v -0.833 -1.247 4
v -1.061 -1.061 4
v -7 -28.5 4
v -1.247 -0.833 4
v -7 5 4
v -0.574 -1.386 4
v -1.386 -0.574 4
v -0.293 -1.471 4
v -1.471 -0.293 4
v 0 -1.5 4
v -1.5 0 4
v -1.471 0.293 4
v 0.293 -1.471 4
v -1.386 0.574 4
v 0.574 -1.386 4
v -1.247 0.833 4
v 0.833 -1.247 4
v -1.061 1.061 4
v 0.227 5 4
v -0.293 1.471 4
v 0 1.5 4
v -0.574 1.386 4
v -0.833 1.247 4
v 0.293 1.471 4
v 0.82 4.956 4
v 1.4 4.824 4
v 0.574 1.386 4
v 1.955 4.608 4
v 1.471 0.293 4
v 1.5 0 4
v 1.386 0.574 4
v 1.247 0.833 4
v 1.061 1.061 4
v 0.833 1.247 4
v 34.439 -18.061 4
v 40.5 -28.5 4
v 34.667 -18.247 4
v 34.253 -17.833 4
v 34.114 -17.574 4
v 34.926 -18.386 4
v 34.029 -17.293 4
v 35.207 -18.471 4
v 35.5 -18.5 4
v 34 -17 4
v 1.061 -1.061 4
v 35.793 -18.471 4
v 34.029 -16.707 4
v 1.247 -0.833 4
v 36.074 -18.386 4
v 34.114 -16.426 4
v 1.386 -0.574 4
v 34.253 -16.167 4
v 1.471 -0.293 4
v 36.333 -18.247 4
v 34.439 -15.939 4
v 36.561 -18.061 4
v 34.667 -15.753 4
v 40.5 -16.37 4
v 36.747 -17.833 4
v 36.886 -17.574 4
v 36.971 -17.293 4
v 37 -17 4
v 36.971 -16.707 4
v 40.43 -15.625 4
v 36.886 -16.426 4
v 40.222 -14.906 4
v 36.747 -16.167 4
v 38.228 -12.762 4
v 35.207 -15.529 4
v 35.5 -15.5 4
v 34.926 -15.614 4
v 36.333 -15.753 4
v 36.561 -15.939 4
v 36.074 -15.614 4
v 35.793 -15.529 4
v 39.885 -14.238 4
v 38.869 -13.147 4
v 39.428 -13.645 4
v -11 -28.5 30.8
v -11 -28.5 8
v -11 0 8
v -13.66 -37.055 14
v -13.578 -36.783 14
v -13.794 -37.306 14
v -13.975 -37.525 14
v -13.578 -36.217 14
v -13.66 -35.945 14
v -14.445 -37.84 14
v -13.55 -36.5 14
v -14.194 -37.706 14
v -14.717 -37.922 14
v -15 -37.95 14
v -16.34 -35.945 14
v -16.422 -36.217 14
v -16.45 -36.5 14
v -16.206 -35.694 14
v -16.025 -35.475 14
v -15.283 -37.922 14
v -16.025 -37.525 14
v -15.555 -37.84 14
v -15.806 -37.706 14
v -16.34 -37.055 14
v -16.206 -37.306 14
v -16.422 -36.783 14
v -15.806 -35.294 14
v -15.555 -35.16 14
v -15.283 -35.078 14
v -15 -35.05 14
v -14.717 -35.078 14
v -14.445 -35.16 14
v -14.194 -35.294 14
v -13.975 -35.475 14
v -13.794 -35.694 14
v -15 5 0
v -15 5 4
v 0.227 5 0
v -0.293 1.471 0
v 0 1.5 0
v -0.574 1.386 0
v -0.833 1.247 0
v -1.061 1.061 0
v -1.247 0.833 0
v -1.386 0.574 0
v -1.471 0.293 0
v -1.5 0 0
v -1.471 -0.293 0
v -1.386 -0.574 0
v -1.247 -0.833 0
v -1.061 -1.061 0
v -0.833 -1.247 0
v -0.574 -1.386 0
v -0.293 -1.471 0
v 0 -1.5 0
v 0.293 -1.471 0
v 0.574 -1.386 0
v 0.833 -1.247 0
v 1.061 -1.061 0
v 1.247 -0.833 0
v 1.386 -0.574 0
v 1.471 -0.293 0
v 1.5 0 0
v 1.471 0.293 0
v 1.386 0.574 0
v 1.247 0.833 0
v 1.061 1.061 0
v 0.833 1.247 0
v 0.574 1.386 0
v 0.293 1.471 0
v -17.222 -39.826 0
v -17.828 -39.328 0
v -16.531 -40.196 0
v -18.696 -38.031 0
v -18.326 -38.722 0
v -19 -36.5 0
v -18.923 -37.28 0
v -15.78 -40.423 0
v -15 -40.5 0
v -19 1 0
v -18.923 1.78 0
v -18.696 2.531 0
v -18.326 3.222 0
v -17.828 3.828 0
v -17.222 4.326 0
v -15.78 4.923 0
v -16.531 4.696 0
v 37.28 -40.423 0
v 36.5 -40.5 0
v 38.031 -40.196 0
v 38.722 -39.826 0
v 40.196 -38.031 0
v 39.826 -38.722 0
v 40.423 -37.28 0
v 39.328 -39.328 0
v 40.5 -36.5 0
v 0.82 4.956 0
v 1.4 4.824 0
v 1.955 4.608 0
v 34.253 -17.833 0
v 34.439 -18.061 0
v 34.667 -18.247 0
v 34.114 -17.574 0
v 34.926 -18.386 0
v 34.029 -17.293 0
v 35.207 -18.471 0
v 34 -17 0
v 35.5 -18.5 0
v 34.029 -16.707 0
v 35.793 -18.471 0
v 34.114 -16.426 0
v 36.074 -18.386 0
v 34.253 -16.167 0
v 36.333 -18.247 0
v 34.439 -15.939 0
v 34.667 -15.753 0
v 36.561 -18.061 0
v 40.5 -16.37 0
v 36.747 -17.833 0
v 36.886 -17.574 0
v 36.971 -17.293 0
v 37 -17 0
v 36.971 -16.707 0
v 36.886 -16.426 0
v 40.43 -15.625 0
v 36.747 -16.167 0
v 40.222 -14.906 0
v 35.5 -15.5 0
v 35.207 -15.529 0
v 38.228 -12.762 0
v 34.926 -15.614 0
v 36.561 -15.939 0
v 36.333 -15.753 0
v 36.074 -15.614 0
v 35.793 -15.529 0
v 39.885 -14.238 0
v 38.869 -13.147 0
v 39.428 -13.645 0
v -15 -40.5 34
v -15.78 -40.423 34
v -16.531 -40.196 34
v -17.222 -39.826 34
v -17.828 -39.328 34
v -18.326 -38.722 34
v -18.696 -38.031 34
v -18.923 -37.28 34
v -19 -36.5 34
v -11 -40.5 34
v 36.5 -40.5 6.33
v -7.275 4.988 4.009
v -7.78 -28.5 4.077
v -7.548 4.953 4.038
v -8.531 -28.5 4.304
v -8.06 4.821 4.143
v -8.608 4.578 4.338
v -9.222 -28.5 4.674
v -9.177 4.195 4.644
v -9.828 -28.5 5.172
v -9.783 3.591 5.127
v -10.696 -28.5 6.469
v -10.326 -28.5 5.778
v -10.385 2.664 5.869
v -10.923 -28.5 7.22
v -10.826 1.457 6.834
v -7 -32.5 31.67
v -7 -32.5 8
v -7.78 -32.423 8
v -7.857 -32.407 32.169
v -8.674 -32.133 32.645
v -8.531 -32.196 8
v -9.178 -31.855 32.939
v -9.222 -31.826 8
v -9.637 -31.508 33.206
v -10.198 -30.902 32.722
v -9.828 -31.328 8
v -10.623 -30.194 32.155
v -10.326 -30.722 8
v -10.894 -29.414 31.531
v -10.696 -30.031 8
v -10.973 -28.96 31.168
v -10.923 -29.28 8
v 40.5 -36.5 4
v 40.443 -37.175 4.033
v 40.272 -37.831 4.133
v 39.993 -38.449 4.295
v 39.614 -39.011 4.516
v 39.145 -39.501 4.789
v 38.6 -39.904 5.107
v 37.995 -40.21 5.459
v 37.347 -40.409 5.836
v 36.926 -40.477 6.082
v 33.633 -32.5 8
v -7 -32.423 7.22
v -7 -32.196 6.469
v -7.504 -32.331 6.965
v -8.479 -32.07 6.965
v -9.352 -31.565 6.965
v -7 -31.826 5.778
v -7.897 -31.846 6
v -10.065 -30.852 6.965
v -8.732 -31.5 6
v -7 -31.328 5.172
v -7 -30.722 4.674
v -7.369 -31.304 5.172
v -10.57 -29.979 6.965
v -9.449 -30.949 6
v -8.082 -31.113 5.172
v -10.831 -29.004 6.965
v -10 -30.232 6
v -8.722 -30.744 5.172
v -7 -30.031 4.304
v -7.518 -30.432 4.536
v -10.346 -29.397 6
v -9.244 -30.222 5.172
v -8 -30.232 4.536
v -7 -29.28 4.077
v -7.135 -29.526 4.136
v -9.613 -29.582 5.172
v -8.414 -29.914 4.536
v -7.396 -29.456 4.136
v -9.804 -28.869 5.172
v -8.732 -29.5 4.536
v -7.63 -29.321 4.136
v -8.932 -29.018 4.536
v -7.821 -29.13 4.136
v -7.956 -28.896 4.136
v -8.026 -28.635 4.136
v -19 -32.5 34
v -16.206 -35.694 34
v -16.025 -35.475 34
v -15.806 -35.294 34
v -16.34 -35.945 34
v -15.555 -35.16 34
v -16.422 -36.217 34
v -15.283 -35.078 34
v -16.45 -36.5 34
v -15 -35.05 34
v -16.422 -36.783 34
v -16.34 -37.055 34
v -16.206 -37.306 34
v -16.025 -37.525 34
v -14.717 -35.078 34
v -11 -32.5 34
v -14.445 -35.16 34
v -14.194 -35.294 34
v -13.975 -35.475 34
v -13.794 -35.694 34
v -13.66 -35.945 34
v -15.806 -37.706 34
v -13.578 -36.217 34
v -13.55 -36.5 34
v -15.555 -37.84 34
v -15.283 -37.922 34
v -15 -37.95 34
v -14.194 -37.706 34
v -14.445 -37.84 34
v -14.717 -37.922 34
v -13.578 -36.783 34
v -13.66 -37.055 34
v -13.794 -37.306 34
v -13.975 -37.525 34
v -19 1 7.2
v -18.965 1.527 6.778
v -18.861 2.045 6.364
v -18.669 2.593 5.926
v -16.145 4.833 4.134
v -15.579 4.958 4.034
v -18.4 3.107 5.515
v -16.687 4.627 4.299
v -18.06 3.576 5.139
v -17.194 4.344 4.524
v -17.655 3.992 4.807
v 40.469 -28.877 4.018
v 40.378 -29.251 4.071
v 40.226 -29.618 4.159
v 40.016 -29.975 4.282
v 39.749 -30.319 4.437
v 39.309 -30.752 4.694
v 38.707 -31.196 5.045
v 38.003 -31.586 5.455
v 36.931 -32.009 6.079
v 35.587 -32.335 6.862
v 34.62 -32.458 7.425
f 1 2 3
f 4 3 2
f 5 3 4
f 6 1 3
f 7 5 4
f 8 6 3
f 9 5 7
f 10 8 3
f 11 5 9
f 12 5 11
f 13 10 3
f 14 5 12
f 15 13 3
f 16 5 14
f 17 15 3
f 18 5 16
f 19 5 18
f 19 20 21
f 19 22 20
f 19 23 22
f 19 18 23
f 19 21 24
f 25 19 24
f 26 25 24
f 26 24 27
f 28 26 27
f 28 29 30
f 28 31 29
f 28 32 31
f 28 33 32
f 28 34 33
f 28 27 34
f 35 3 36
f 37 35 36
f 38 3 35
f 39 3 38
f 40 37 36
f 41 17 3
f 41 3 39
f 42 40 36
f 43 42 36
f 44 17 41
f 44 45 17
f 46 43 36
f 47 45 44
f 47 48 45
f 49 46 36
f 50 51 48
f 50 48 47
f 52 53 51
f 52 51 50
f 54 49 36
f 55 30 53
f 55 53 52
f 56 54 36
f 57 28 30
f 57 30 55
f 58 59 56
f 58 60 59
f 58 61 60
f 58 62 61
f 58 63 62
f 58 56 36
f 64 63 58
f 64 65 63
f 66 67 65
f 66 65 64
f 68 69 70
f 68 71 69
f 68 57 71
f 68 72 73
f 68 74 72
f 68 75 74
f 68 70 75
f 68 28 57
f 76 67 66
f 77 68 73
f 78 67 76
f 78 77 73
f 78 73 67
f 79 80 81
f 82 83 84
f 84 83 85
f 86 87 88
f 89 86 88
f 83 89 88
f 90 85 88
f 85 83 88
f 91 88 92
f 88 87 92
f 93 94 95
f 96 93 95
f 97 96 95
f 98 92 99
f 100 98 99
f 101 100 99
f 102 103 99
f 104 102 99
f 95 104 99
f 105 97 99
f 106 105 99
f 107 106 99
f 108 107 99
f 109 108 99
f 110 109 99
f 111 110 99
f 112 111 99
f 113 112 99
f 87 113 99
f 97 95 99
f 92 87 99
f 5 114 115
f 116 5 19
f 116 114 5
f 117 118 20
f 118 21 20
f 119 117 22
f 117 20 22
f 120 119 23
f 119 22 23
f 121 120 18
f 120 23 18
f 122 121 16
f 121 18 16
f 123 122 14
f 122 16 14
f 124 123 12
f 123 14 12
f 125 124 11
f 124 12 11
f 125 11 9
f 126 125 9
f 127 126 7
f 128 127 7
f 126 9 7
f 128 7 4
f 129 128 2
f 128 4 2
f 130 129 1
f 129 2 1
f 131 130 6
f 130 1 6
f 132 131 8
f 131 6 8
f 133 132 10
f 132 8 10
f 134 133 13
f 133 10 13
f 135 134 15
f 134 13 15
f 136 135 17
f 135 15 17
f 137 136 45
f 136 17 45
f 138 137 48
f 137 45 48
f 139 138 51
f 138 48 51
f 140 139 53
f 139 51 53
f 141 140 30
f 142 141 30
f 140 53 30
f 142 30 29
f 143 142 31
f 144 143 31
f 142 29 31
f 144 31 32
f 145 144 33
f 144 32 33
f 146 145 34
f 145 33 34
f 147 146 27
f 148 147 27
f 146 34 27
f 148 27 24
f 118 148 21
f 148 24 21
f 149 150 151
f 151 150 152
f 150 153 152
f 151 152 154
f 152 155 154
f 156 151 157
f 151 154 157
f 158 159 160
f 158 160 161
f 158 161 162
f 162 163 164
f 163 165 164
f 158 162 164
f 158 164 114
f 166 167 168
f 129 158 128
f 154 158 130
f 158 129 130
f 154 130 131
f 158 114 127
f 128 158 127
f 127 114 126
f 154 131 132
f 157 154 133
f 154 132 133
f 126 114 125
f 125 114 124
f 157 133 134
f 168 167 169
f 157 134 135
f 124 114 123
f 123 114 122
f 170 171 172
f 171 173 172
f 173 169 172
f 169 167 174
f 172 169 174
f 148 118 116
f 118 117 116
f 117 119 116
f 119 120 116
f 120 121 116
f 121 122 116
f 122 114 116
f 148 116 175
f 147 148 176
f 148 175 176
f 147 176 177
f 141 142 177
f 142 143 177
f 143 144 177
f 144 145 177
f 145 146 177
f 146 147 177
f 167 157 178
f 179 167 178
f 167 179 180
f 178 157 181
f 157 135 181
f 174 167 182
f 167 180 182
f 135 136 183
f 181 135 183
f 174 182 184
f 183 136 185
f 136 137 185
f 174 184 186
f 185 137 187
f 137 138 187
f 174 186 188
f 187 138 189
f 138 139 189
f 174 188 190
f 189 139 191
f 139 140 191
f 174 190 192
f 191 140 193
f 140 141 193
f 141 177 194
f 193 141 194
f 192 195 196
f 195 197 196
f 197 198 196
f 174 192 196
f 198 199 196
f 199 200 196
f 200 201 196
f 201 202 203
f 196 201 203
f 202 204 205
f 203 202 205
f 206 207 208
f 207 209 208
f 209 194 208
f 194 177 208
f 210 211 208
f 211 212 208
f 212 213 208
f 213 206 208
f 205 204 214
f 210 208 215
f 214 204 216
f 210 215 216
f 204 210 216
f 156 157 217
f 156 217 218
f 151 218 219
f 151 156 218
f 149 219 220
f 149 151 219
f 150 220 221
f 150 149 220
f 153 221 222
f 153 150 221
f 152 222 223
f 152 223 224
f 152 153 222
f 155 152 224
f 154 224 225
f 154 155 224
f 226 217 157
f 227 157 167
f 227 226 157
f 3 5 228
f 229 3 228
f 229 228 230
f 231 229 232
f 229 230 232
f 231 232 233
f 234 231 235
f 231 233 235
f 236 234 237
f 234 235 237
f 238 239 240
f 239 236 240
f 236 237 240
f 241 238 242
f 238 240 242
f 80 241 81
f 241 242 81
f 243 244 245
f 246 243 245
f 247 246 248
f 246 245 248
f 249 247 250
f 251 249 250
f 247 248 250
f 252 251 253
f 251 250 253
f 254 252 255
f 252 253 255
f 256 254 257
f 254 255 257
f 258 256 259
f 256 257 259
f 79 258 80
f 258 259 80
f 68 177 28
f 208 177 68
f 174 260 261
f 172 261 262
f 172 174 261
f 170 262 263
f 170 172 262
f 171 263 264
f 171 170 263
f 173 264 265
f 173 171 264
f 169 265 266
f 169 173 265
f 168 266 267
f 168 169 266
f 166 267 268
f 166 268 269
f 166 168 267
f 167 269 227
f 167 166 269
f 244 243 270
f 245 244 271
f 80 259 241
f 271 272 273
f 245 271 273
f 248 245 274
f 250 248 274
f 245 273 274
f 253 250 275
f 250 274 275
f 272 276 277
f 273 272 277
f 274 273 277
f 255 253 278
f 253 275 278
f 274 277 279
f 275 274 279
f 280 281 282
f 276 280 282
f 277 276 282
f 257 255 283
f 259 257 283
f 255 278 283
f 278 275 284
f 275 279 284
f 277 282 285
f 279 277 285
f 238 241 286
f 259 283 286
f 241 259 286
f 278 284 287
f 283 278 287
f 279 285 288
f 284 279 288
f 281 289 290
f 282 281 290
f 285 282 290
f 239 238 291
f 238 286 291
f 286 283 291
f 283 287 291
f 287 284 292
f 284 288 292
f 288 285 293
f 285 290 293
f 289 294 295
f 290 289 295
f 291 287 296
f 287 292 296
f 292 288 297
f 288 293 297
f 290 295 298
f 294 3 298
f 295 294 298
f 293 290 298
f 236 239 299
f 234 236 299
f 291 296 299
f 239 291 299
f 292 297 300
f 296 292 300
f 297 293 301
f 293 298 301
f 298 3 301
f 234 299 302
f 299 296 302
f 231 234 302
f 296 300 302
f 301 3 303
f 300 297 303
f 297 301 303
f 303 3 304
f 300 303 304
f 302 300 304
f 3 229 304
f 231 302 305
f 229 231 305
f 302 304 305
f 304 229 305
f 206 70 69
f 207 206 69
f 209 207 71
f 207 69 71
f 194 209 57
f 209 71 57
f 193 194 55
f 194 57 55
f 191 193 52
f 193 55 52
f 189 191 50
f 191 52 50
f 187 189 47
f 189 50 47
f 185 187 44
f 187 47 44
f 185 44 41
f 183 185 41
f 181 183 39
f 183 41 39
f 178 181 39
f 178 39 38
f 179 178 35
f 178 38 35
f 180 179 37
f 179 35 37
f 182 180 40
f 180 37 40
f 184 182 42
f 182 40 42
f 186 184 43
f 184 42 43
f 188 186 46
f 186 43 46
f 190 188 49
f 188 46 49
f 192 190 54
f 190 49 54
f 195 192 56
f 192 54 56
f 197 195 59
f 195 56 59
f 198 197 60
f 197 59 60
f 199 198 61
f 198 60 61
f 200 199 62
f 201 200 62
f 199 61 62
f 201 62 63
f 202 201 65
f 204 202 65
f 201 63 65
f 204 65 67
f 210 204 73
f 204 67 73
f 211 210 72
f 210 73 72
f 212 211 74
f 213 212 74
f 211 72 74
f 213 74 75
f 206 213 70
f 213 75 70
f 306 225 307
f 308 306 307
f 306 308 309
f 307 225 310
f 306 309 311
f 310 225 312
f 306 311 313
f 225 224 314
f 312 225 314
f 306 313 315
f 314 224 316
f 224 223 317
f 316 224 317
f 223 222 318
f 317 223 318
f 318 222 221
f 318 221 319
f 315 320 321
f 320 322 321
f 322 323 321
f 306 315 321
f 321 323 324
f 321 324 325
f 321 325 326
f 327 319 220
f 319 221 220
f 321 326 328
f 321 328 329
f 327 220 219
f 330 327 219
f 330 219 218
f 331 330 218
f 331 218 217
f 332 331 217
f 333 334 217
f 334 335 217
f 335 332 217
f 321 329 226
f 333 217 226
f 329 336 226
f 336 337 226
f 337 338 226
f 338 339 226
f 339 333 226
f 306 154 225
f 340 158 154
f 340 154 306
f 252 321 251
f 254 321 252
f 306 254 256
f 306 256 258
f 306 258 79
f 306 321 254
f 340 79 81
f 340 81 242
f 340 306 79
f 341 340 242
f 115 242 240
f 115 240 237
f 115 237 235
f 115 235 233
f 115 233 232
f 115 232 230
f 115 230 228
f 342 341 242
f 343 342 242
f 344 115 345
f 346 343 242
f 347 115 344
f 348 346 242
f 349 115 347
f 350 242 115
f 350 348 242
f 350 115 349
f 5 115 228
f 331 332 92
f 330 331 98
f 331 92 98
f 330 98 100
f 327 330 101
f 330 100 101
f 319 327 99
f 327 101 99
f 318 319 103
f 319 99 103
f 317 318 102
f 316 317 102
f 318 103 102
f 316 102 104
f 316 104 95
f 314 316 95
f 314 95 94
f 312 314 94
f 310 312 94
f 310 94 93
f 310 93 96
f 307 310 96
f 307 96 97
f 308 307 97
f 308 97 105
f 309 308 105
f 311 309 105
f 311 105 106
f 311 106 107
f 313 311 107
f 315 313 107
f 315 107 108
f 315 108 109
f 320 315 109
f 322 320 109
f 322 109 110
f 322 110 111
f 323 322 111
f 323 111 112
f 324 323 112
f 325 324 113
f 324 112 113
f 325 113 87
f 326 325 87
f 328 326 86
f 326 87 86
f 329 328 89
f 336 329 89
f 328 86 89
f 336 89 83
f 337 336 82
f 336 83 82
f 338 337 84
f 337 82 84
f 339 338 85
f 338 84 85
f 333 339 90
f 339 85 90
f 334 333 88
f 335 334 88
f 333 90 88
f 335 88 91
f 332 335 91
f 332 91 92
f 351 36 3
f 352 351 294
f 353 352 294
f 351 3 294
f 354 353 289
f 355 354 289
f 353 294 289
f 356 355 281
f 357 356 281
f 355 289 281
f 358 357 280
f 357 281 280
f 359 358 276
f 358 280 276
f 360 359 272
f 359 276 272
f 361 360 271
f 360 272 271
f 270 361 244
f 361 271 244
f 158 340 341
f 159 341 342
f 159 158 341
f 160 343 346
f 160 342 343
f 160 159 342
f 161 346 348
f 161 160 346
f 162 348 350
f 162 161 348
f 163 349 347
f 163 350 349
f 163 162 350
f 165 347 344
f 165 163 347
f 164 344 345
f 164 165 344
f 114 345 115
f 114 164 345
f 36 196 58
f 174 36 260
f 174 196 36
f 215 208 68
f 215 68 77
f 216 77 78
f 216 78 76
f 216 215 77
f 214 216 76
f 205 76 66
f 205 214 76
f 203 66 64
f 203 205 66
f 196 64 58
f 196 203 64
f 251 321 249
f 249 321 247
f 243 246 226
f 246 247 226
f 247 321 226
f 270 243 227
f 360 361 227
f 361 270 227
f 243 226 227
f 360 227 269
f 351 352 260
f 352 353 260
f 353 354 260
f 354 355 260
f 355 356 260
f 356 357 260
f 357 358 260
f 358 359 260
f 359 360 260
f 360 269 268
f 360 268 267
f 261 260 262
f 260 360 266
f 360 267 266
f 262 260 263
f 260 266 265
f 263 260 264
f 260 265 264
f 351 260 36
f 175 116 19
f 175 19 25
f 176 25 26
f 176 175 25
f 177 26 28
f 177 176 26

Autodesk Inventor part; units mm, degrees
ref_plane "YZ Plane" through (0, 0, 0) normal (1, 0, 0) x (0, 1, 0)
ref_plane "XZ Plane" through (0, 0, 0) normal (0, 1, 0) x (-1, 0, 0)
ref_plane "XY Plane" through (0, 0, 0) normal (0, 0, 1) x (1, 0, 0)
sketch "Sketch1" plane through (0, 0, 0) normal (0, 0, 1) x (1, 0, 0)
  line L0 (-19, 5) -> (40.5, 5)
  line L1 (40.5, 5) -> (40.5, -40.5)
  line L2 (40.5, -40.5) -> (-19, -40.5)
  line L3 (-19, -40.5) -> (-19, 5)
  line L4 (1.1354, 5) -> (40.5, -13.8506)
  line L5 (35.5, -17) -> (0, 0) construction
  point P0 (-15, -36.5)
  dimension "d0" = 35.5
  dimension "d1" = 17
  dimension "d2" = 50.5
  dimension "d3" = 19.5
  dimension "d4" = 5
  dimension "d5" = 5
  dimension "d6" = 4
  dimension "d7" = 4
  dimension "d31" = 5
extrude "Extrusion1" add sketch "Sketch1" along normal blind 4 contours L0 L4 L1 L2 L3
hole "Hole1" at (35.5, -17, 0) at (0, 0, 0) direction (0, 0, 1) diameter 3 depth 20
sketch "Sketch2" plane through (-19, -40.5, 0) normal (0, -1, 0) x (1, 0, 0)
  line L0 (0, 0) -> (59.5, 0) projected
  line L1 (59.5, 0) -> (59.5, 4) projected
  line L2 (0, 4) -> (59.5, 4) projected
  line L3 (0, 0) -> (0, 4) projected
  line L4 (0, 4) -> (0, 34)
  line L5 (0, 34) -> (8, 34)
  line L6 (8, 34) -> (59.5, 4)
  point P0 (19, 0)
  dimension "d17" = 34
  dimension "d18" = 8
extrude "Extrusion2" add sketch "Sketch2" against normal blind 8 contours L4 L5 L6 L2
sketch "Sketch3" plane through (-19, -40.5, 0) normal (-1, 0, 0) x (0, 0, 1)
  line L0 (0, 45.5) -> (0, 0) projected
  line L1 (0, 0) -> (34, 0) projected
  line L2 (34, 0) -> (34, 8) projected
  line L3 (4, 8) -> (34, 8) projected
  line L4 (4, 45.5) -> (4, 8) projected
  line L5 (0, 45.5) -> (4, 45.5) projected
  line L6 (34, 8) -> (4, 45.5)
  point P0 (0, 40.5)
extrude "Extrusion3" add sketch "Sketch3" against normal blind 8 contours L6 L3 L4
fillet "Fillet1" radius 4 8 edges at (-11, -13.75, 4) (14.75, -32.5, 4) (-11, -32.5, 19) (40.5, -40.5, 2) (-19, 5, 2) (1.1354, 5, 2) (40.5, -13.8506, 2) (-19, -40.5, 17)
sketch "Sketch4" plane through (-19, -40.5, 34) normal (0, 0, 1) x (1, 0, 0)
  line L0 (8, 0) -> (4, 0) projected
  line L1 (8, 0) -> (8, 8) projected
  line L2 (0, 8) -> (8, 8) projected
  line L3 (0, 4) -> (0, 8) projected
  arc A0 (0, 4) -> (4, 0) centre (4, 4) ccw projected
  point P0 (19, 40.5)
  point P1 (4, 4)
hole "Hole2" at (-15, -36.5, 34) direction (0, 0, -1) diameter 2.9 depth 20
equation "\"d5\" = d4"
equation "\"d6\" = d7"
equation "\"d23\" = d7"
properties part number "FrontLevelBlock" material "ABS Plastic"
